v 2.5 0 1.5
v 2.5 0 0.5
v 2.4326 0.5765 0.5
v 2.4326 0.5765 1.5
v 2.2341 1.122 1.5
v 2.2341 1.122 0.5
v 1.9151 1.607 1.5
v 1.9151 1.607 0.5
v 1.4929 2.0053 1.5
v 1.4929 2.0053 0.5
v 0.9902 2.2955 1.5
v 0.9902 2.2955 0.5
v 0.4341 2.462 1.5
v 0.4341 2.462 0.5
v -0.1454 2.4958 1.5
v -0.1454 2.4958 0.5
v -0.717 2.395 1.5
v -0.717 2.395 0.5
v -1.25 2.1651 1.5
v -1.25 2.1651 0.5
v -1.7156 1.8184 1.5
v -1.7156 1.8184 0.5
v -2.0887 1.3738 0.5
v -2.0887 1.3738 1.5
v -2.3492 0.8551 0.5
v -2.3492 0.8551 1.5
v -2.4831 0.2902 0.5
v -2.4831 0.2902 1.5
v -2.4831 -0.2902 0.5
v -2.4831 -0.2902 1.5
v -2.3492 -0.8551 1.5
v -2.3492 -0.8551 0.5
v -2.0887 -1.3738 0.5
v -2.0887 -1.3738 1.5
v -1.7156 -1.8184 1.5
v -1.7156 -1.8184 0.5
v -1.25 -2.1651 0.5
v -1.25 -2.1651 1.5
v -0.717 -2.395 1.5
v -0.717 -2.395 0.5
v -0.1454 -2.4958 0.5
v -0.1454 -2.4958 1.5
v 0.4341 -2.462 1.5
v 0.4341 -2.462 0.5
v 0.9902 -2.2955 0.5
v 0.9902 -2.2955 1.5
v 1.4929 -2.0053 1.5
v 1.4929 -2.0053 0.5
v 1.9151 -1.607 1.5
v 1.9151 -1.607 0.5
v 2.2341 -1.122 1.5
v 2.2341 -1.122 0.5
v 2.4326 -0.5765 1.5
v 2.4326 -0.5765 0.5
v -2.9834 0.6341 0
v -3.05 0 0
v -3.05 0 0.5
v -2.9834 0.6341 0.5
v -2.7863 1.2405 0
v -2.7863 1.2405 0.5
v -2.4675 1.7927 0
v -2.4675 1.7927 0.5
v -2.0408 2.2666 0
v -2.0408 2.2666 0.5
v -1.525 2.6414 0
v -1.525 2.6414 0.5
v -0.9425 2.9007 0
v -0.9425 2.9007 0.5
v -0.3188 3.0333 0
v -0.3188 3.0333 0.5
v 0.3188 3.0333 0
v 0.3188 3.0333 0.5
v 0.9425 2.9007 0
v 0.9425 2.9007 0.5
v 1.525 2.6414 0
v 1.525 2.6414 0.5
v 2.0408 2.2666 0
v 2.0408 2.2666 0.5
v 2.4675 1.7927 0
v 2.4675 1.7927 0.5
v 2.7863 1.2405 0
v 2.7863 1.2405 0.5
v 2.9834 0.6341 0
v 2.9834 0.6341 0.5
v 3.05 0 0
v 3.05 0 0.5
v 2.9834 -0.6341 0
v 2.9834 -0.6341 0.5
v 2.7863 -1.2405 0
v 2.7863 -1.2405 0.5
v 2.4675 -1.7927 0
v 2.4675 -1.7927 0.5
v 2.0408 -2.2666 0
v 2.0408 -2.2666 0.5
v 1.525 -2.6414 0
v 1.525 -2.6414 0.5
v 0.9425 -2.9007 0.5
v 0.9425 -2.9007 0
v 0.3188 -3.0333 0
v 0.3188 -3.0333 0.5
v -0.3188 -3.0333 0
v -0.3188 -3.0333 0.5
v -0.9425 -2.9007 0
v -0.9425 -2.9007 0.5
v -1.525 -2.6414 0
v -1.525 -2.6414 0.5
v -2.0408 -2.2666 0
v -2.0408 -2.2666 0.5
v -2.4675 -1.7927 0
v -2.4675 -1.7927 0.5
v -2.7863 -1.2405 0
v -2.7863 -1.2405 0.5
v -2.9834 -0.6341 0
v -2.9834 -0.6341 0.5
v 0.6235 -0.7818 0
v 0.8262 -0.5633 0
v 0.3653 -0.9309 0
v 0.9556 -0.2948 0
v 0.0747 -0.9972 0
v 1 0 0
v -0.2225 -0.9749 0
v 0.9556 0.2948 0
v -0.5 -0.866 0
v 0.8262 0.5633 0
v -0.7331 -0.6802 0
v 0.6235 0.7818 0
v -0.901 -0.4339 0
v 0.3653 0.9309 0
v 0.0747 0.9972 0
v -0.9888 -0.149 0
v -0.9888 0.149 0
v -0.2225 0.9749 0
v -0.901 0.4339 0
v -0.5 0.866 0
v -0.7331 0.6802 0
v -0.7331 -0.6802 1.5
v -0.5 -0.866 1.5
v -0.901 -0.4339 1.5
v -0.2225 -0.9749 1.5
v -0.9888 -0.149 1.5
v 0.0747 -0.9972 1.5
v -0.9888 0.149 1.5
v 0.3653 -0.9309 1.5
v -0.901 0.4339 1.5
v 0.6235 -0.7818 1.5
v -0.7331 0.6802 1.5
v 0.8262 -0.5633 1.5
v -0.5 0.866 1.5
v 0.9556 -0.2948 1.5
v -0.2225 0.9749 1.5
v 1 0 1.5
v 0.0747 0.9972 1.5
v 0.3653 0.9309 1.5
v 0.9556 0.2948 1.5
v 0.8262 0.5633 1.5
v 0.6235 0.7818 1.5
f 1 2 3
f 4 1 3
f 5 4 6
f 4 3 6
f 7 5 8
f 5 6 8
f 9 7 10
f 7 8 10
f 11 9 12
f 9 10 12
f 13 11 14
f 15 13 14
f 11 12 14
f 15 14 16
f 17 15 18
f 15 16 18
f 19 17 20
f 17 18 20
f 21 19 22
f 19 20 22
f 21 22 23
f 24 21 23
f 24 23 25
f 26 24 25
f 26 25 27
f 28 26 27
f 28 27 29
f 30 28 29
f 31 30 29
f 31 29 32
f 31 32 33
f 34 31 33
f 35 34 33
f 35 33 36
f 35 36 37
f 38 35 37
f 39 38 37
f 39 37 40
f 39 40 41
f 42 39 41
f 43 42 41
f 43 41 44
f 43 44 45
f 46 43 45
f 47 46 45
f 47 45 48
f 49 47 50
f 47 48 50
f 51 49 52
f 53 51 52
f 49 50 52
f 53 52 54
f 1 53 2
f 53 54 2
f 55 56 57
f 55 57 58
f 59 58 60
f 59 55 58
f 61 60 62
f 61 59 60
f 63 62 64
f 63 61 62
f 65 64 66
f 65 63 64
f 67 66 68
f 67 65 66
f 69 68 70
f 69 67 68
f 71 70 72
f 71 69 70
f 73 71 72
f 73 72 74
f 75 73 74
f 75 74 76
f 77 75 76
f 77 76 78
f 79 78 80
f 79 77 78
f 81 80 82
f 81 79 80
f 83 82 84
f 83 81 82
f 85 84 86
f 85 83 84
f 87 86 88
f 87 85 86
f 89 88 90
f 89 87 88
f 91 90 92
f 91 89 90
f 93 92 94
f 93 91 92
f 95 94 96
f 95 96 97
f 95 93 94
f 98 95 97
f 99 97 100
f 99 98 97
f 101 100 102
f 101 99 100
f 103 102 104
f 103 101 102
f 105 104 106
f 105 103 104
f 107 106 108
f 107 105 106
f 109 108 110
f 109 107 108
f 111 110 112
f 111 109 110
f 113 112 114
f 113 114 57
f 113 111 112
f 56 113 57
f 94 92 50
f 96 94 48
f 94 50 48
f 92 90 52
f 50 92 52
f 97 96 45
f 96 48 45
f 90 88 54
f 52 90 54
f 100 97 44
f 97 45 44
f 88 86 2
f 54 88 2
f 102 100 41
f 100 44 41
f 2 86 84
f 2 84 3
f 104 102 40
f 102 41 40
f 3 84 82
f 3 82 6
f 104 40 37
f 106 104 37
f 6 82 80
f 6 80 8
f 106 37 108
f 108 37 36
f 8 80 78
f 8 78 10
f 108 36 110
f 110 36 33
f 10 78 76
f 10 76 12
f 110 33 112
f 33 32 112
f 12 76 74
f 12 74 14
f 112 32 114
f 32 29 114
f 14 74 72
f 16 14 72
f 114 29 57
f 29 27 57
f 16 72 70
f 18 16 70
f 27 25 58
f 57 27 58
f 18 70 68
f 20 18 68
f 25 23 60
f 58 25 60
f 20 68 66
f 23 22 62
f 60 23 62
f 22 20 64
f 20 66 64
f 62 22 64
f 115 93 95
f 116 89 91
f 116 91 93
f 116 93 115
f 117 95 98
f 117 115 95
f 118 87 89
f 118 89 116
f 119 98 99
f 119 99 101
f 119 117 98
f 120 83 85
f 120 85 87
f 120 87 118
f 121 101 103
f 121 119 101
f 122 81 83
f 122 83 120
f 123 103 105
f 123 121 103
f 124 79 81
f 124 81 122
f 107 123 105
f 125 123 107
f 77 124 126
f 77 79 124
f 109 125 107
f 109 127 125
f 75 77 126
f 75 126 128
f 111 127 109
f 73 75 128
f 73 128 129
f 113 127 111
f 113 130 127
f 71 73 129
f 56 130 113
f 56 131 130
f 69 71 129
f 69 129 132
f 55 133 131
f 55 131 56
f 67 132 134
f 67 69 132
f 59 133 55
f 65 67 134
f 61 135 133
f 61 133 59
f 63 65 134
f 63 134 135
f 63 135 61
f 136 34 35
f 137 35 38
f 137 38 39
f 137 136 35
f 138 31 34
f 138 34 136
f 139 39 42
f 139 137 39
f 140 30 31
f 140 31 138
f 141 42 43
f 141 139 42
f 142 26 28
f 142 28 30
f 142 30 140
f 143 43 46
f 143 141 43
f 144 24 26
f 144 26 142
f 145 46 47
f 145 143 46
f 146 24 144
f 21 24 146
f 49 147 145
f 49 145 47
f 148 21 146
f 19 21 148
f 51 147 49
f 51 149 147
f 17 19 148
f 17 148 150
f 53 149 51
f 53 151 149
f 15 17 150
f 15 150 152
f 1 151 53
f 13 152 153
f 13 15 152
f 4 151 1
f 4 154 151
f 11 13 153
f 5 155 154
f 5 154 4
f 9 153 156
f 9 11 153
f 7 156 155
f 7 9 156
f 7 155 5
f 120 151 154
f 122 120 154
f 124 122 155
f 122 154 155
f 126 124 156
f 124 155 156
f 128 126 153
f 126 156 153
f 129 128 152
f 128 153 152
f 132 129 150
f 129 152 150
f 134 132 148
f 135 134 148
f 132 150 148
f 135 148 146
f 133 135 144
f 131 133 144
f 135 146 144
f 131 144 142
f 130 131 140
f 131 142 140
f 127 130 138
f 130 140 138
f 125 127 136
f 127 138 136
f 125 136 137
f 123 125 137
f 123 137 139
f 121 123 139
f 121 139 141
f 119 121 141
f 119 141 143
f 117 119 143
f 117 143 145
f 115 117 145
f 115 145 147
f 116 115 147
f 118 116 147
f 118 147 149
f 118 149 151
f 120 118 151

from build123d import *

# Parameters (mm, degrees)
SKETCH_1_R               = 2.5
EXTRUDE_1_DEPTH          = 1.5
SKETCH_3_R               = 3.05
EXTRUDE_2_DEPTH          = 0.5
SKETCH_4_R               = 1
CUT_EXTRUDE_1_DEPTH      = 1
CUT_EXTRUDE_1_DEPTH_BACK = 2.5


with BuildPart() as part:
    # Эскиз1 → Бобышка-Вытянуть1 (new body)
    with BuildSketch(Plane.XY):
        Circle(SKETCH_1_R)
    extrude(amount=EXTRUDE_1_DEPTH)

    # Эскиз3 → Бобышка-Вытянуть2 (add)
    with BuildSketch(Plane(origin=(0, 0, 0), x_dir=(-1, 0, 0), z_dir=(0, 0, -1))):
        Circle(SKETCH_3_R)
    extrude(amount=-EXTRUDE_2_DEPTH)

    # Эскиз4 → Вырез-Вытянуть1 (cut, two sides)
    with BuildSketch(Plane.XY.offset(1.5)) as cut_extrude_1_sk:
        Circle(SKETCH_4_R)
    extrude(amount=CUT_EXTRUDE_1_DEPTH, mode=Mode.SUBTRACT)
    extrude(cut_extrude_1_sk.sketch, amount=-CUT_EXTRUDE_1_DEPTH_BACK, mode=Mode.SUBTRACT)


solid = part.part
